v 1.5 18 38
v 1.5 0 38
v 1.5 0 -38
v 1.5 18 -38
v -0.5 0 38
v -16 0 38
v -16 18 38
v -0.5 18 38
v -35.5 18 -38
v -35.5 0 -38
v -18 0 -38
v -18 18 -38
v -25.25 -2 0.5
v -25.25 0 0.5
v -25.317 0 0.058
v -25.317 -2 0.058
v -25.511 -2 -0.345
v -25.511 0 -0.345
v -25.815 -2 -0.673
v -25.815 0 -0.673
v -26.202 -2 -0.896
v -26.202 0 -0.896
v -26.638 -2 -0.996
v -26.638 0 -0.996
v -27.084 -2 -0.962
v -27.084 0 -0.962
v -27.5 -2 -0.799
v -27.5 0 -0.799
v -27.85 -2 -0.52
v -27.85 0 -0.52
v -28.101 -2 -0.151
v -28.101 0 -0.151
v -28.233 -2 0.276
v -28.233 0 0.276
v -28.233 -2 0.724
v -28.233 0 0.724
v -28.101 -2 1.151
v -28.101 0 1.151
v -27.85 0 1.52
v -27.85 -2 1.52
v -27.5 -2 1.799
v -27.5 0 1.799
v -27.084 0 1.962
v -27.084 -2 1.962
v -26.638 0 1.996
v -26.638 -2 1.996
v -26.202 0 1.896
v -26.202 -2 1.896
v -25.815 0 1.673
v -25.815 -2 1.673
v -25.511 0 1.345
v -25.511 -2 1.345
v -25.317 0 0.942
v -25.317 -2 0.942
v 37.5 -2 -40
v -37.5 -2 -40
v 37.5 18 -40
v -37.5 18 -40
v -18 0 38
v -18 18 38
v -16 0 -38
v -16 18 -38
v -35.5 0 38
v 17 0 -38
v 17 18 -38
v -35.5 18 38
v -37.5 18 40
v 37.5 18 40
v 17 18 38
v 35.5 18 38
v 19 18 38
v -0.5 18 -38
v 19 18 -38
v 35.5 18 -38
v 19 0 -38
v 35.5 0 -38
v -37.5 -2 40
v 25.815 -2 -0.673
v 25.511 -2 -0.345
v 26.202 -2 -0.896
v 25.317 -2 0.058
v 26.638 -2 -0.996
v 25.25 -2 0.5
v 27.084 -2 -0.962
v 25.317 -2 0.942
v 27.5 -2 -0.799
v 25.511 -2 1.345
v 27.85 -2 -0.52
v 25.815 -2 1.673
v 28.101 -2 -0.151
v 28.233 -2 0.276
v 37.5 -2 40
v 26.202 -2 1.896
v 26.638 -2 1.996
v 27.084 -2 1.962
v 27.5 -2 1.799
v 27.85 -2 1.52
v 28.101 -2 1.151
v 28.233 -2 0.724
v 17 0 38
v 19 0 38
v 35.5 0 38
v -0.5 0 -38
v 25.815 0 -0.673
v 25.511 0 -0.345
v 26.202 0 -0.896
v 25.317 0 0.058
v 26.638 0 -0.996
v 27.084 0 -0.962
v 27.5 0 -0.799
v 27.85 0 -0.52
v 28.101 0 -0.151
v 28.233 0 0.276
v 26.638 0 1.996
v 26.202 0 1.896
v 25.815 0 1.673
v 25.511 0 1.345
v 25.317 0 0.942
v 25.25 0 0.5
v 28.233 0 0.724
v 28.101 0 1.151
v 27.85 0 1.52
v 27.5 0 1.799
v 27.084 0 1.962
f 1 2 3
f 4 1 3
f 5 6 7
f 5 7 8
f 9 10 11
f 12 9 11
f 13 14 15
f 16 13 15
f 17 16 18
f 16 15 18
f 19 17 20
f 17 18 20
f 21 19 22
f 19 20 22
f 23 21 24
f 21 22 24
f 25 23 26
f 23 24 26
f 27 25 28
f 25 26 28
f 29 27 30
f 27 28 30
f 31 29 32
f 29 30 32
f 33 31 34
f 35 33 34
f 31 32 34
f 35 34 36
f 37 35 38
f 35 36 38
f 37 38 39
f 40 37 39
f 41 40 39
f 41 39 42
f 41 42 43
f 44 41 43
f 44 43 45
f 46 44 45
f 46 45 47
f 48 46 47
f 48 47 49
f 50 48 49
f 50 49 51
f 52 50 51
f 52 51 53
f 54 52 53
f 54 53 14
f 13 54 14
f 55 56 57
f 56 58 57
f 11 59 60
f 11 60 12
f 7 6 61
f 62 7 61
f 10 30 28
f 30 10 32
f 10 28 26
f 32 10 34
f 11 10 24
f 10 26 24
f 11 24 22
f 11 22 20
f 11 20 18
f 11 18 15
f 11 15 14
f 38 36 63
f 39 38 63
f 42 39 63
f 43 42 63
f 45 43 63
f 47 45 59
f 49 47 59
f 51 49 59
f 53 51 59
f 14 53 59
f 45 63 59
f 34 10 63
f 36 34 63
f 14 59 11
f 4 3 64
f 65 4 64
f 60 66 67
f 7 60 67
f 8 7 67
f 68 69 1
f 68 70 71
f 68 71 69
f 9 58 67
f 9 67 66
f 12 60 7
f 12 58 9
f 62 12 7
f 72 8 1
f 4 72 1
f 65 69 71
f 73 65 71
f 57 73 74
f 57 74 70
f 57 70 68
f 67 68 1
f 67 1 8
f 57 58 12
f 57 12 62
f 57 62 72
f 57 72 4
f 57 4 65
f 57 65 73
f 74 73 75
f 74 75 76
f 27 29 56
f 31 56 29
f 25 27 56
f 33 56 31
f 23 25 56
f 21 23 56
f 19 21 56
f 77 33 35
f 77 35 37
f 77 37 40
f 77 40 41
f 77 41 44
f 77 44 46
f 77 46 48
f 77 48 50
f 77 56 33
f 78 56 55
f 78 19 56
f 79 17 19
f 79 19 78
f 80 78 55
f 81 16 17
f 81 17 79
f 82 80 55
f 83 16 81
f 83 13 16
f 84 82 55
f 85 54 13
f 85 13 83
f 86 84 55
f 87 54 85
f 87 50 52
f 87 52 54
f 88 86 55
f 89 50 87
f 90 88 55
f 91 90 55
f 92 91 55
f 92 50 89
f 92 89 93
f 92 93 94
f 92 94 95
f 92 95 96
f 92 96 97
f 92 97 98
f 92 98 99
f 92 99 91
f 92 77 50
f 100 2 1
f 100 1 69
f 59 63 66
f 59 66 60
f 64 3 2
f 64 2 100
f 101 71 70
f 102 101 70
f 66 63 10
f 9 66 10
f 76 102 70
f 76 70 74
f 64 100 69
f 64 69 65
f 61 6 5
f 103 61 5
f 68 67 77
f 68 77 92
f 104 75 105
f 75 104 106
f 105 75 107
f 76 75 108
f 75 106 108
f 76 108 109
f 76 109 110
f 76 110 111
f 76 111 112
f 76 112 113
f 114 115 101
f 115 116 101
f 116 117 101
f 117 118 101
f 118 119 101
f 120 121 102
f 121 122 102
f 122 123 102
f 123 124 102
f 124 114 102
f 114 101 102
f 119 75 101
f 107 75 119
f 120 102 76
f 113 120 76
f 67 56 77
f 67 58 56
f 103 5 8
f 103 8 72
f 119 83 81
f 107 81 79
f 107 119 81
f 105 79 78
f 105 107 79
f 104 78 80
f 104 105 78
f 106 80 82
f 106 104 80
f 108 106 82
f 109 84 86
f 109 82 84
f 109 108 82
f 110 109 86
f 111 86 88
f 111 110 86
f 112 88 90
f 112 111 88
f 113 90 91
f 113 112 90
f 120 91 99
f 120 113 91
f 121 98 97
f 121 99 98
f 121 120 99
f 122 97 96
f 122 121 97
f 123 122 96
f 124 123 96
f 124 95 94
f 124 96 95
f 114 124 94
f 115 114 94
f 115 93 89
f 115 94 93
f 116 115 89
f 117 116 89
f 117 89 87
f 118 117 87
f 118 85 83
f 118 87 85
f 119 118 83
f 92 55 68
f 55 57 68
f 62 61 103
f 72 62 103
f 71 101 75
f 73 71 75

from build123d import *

# Parameters (mm, degrees)
SKETCH2_W           = 75
SKETCH2_H           = 80
SKETCH2_W_2         = 17.5
SKETCH2_H_2         = 76
SKETCH2_W_3         = 16.5
SKETCH2_W_4         = 15.5
BOSS_EXTRUDE1_DEPTH = 18
SKETCH3_W           = 75
SKETCH3_H           = 80
BOSS_EXTRUDE3_DEPTH = 2
SKETCH4_R           = 1.5
CUT_EXTRUDE1_DEPTH  = 3


with BuildPart() as part:
    # Sketch2 → Boss-Extrude1 (new body)
    with BuildSketch(Plane(origin=(0, 0, 0), x_dir=(1, 0, 0), z_dir=(0, 1, 0))):
        Rectangle(SKETCH2_W, SKETCH2_H)
        with Locations((-26.75, 0)):
            Rectangle(SKETCH2_W_2, SKETCH2_H_2, mode=Mode.SUBTRACT)
        with Locations((27.25, 0)):
            Rectangle(SKETCH2_W_3, SKETCH2_H_2, mode=Mode.SUBTRACT)
        with Locations((-8.25, 0)):
            Rectangle(SKETCH2_W_4, SKETCH2_H_2, mode=Mode.SUBTRACT)
        with Locations((9.25, 0)):
            Rectangle(SKETCH2_W_4, SKETCH2_H_2, mode=Mode.SUBTRACT)
    extrude(amount=BOSS_EXTRUDE1_DEPTH)

    # Sketch3 → Boss-Extrude3 (add)
    with BuildSketch(Plane.XZ):
        Rectangle(SKETCH3_W, SKETCH3_H)
    extrude(amount=BOSS_EXTRUDE3_DEPTH)

    # Sketch4 → Cut-Extrude1 (cut, through all)
    with BuildSketch(Plane(origin=(0, 0, 0), x_dir=(1, 0, 0), z_dir=(0, 1, 0))):
        with Locations((-26.75, -0.5)):
            Circle(SKETCH4_R)
    cut_extrude1 = extrude(amount=-CUT_EXTRUDE1_DEPTH, mode=Mode.SUBTRACT)

    # Mirror1: Cut-Extrude1 across plane
    add(cut_extrude1.mirror(Plane(origin=(0, 0, 0), x_dir=(0, 0, 1), z_dir=(1, 0, 0))), mode=Mode.SUBTRACT)


solid = part.part
